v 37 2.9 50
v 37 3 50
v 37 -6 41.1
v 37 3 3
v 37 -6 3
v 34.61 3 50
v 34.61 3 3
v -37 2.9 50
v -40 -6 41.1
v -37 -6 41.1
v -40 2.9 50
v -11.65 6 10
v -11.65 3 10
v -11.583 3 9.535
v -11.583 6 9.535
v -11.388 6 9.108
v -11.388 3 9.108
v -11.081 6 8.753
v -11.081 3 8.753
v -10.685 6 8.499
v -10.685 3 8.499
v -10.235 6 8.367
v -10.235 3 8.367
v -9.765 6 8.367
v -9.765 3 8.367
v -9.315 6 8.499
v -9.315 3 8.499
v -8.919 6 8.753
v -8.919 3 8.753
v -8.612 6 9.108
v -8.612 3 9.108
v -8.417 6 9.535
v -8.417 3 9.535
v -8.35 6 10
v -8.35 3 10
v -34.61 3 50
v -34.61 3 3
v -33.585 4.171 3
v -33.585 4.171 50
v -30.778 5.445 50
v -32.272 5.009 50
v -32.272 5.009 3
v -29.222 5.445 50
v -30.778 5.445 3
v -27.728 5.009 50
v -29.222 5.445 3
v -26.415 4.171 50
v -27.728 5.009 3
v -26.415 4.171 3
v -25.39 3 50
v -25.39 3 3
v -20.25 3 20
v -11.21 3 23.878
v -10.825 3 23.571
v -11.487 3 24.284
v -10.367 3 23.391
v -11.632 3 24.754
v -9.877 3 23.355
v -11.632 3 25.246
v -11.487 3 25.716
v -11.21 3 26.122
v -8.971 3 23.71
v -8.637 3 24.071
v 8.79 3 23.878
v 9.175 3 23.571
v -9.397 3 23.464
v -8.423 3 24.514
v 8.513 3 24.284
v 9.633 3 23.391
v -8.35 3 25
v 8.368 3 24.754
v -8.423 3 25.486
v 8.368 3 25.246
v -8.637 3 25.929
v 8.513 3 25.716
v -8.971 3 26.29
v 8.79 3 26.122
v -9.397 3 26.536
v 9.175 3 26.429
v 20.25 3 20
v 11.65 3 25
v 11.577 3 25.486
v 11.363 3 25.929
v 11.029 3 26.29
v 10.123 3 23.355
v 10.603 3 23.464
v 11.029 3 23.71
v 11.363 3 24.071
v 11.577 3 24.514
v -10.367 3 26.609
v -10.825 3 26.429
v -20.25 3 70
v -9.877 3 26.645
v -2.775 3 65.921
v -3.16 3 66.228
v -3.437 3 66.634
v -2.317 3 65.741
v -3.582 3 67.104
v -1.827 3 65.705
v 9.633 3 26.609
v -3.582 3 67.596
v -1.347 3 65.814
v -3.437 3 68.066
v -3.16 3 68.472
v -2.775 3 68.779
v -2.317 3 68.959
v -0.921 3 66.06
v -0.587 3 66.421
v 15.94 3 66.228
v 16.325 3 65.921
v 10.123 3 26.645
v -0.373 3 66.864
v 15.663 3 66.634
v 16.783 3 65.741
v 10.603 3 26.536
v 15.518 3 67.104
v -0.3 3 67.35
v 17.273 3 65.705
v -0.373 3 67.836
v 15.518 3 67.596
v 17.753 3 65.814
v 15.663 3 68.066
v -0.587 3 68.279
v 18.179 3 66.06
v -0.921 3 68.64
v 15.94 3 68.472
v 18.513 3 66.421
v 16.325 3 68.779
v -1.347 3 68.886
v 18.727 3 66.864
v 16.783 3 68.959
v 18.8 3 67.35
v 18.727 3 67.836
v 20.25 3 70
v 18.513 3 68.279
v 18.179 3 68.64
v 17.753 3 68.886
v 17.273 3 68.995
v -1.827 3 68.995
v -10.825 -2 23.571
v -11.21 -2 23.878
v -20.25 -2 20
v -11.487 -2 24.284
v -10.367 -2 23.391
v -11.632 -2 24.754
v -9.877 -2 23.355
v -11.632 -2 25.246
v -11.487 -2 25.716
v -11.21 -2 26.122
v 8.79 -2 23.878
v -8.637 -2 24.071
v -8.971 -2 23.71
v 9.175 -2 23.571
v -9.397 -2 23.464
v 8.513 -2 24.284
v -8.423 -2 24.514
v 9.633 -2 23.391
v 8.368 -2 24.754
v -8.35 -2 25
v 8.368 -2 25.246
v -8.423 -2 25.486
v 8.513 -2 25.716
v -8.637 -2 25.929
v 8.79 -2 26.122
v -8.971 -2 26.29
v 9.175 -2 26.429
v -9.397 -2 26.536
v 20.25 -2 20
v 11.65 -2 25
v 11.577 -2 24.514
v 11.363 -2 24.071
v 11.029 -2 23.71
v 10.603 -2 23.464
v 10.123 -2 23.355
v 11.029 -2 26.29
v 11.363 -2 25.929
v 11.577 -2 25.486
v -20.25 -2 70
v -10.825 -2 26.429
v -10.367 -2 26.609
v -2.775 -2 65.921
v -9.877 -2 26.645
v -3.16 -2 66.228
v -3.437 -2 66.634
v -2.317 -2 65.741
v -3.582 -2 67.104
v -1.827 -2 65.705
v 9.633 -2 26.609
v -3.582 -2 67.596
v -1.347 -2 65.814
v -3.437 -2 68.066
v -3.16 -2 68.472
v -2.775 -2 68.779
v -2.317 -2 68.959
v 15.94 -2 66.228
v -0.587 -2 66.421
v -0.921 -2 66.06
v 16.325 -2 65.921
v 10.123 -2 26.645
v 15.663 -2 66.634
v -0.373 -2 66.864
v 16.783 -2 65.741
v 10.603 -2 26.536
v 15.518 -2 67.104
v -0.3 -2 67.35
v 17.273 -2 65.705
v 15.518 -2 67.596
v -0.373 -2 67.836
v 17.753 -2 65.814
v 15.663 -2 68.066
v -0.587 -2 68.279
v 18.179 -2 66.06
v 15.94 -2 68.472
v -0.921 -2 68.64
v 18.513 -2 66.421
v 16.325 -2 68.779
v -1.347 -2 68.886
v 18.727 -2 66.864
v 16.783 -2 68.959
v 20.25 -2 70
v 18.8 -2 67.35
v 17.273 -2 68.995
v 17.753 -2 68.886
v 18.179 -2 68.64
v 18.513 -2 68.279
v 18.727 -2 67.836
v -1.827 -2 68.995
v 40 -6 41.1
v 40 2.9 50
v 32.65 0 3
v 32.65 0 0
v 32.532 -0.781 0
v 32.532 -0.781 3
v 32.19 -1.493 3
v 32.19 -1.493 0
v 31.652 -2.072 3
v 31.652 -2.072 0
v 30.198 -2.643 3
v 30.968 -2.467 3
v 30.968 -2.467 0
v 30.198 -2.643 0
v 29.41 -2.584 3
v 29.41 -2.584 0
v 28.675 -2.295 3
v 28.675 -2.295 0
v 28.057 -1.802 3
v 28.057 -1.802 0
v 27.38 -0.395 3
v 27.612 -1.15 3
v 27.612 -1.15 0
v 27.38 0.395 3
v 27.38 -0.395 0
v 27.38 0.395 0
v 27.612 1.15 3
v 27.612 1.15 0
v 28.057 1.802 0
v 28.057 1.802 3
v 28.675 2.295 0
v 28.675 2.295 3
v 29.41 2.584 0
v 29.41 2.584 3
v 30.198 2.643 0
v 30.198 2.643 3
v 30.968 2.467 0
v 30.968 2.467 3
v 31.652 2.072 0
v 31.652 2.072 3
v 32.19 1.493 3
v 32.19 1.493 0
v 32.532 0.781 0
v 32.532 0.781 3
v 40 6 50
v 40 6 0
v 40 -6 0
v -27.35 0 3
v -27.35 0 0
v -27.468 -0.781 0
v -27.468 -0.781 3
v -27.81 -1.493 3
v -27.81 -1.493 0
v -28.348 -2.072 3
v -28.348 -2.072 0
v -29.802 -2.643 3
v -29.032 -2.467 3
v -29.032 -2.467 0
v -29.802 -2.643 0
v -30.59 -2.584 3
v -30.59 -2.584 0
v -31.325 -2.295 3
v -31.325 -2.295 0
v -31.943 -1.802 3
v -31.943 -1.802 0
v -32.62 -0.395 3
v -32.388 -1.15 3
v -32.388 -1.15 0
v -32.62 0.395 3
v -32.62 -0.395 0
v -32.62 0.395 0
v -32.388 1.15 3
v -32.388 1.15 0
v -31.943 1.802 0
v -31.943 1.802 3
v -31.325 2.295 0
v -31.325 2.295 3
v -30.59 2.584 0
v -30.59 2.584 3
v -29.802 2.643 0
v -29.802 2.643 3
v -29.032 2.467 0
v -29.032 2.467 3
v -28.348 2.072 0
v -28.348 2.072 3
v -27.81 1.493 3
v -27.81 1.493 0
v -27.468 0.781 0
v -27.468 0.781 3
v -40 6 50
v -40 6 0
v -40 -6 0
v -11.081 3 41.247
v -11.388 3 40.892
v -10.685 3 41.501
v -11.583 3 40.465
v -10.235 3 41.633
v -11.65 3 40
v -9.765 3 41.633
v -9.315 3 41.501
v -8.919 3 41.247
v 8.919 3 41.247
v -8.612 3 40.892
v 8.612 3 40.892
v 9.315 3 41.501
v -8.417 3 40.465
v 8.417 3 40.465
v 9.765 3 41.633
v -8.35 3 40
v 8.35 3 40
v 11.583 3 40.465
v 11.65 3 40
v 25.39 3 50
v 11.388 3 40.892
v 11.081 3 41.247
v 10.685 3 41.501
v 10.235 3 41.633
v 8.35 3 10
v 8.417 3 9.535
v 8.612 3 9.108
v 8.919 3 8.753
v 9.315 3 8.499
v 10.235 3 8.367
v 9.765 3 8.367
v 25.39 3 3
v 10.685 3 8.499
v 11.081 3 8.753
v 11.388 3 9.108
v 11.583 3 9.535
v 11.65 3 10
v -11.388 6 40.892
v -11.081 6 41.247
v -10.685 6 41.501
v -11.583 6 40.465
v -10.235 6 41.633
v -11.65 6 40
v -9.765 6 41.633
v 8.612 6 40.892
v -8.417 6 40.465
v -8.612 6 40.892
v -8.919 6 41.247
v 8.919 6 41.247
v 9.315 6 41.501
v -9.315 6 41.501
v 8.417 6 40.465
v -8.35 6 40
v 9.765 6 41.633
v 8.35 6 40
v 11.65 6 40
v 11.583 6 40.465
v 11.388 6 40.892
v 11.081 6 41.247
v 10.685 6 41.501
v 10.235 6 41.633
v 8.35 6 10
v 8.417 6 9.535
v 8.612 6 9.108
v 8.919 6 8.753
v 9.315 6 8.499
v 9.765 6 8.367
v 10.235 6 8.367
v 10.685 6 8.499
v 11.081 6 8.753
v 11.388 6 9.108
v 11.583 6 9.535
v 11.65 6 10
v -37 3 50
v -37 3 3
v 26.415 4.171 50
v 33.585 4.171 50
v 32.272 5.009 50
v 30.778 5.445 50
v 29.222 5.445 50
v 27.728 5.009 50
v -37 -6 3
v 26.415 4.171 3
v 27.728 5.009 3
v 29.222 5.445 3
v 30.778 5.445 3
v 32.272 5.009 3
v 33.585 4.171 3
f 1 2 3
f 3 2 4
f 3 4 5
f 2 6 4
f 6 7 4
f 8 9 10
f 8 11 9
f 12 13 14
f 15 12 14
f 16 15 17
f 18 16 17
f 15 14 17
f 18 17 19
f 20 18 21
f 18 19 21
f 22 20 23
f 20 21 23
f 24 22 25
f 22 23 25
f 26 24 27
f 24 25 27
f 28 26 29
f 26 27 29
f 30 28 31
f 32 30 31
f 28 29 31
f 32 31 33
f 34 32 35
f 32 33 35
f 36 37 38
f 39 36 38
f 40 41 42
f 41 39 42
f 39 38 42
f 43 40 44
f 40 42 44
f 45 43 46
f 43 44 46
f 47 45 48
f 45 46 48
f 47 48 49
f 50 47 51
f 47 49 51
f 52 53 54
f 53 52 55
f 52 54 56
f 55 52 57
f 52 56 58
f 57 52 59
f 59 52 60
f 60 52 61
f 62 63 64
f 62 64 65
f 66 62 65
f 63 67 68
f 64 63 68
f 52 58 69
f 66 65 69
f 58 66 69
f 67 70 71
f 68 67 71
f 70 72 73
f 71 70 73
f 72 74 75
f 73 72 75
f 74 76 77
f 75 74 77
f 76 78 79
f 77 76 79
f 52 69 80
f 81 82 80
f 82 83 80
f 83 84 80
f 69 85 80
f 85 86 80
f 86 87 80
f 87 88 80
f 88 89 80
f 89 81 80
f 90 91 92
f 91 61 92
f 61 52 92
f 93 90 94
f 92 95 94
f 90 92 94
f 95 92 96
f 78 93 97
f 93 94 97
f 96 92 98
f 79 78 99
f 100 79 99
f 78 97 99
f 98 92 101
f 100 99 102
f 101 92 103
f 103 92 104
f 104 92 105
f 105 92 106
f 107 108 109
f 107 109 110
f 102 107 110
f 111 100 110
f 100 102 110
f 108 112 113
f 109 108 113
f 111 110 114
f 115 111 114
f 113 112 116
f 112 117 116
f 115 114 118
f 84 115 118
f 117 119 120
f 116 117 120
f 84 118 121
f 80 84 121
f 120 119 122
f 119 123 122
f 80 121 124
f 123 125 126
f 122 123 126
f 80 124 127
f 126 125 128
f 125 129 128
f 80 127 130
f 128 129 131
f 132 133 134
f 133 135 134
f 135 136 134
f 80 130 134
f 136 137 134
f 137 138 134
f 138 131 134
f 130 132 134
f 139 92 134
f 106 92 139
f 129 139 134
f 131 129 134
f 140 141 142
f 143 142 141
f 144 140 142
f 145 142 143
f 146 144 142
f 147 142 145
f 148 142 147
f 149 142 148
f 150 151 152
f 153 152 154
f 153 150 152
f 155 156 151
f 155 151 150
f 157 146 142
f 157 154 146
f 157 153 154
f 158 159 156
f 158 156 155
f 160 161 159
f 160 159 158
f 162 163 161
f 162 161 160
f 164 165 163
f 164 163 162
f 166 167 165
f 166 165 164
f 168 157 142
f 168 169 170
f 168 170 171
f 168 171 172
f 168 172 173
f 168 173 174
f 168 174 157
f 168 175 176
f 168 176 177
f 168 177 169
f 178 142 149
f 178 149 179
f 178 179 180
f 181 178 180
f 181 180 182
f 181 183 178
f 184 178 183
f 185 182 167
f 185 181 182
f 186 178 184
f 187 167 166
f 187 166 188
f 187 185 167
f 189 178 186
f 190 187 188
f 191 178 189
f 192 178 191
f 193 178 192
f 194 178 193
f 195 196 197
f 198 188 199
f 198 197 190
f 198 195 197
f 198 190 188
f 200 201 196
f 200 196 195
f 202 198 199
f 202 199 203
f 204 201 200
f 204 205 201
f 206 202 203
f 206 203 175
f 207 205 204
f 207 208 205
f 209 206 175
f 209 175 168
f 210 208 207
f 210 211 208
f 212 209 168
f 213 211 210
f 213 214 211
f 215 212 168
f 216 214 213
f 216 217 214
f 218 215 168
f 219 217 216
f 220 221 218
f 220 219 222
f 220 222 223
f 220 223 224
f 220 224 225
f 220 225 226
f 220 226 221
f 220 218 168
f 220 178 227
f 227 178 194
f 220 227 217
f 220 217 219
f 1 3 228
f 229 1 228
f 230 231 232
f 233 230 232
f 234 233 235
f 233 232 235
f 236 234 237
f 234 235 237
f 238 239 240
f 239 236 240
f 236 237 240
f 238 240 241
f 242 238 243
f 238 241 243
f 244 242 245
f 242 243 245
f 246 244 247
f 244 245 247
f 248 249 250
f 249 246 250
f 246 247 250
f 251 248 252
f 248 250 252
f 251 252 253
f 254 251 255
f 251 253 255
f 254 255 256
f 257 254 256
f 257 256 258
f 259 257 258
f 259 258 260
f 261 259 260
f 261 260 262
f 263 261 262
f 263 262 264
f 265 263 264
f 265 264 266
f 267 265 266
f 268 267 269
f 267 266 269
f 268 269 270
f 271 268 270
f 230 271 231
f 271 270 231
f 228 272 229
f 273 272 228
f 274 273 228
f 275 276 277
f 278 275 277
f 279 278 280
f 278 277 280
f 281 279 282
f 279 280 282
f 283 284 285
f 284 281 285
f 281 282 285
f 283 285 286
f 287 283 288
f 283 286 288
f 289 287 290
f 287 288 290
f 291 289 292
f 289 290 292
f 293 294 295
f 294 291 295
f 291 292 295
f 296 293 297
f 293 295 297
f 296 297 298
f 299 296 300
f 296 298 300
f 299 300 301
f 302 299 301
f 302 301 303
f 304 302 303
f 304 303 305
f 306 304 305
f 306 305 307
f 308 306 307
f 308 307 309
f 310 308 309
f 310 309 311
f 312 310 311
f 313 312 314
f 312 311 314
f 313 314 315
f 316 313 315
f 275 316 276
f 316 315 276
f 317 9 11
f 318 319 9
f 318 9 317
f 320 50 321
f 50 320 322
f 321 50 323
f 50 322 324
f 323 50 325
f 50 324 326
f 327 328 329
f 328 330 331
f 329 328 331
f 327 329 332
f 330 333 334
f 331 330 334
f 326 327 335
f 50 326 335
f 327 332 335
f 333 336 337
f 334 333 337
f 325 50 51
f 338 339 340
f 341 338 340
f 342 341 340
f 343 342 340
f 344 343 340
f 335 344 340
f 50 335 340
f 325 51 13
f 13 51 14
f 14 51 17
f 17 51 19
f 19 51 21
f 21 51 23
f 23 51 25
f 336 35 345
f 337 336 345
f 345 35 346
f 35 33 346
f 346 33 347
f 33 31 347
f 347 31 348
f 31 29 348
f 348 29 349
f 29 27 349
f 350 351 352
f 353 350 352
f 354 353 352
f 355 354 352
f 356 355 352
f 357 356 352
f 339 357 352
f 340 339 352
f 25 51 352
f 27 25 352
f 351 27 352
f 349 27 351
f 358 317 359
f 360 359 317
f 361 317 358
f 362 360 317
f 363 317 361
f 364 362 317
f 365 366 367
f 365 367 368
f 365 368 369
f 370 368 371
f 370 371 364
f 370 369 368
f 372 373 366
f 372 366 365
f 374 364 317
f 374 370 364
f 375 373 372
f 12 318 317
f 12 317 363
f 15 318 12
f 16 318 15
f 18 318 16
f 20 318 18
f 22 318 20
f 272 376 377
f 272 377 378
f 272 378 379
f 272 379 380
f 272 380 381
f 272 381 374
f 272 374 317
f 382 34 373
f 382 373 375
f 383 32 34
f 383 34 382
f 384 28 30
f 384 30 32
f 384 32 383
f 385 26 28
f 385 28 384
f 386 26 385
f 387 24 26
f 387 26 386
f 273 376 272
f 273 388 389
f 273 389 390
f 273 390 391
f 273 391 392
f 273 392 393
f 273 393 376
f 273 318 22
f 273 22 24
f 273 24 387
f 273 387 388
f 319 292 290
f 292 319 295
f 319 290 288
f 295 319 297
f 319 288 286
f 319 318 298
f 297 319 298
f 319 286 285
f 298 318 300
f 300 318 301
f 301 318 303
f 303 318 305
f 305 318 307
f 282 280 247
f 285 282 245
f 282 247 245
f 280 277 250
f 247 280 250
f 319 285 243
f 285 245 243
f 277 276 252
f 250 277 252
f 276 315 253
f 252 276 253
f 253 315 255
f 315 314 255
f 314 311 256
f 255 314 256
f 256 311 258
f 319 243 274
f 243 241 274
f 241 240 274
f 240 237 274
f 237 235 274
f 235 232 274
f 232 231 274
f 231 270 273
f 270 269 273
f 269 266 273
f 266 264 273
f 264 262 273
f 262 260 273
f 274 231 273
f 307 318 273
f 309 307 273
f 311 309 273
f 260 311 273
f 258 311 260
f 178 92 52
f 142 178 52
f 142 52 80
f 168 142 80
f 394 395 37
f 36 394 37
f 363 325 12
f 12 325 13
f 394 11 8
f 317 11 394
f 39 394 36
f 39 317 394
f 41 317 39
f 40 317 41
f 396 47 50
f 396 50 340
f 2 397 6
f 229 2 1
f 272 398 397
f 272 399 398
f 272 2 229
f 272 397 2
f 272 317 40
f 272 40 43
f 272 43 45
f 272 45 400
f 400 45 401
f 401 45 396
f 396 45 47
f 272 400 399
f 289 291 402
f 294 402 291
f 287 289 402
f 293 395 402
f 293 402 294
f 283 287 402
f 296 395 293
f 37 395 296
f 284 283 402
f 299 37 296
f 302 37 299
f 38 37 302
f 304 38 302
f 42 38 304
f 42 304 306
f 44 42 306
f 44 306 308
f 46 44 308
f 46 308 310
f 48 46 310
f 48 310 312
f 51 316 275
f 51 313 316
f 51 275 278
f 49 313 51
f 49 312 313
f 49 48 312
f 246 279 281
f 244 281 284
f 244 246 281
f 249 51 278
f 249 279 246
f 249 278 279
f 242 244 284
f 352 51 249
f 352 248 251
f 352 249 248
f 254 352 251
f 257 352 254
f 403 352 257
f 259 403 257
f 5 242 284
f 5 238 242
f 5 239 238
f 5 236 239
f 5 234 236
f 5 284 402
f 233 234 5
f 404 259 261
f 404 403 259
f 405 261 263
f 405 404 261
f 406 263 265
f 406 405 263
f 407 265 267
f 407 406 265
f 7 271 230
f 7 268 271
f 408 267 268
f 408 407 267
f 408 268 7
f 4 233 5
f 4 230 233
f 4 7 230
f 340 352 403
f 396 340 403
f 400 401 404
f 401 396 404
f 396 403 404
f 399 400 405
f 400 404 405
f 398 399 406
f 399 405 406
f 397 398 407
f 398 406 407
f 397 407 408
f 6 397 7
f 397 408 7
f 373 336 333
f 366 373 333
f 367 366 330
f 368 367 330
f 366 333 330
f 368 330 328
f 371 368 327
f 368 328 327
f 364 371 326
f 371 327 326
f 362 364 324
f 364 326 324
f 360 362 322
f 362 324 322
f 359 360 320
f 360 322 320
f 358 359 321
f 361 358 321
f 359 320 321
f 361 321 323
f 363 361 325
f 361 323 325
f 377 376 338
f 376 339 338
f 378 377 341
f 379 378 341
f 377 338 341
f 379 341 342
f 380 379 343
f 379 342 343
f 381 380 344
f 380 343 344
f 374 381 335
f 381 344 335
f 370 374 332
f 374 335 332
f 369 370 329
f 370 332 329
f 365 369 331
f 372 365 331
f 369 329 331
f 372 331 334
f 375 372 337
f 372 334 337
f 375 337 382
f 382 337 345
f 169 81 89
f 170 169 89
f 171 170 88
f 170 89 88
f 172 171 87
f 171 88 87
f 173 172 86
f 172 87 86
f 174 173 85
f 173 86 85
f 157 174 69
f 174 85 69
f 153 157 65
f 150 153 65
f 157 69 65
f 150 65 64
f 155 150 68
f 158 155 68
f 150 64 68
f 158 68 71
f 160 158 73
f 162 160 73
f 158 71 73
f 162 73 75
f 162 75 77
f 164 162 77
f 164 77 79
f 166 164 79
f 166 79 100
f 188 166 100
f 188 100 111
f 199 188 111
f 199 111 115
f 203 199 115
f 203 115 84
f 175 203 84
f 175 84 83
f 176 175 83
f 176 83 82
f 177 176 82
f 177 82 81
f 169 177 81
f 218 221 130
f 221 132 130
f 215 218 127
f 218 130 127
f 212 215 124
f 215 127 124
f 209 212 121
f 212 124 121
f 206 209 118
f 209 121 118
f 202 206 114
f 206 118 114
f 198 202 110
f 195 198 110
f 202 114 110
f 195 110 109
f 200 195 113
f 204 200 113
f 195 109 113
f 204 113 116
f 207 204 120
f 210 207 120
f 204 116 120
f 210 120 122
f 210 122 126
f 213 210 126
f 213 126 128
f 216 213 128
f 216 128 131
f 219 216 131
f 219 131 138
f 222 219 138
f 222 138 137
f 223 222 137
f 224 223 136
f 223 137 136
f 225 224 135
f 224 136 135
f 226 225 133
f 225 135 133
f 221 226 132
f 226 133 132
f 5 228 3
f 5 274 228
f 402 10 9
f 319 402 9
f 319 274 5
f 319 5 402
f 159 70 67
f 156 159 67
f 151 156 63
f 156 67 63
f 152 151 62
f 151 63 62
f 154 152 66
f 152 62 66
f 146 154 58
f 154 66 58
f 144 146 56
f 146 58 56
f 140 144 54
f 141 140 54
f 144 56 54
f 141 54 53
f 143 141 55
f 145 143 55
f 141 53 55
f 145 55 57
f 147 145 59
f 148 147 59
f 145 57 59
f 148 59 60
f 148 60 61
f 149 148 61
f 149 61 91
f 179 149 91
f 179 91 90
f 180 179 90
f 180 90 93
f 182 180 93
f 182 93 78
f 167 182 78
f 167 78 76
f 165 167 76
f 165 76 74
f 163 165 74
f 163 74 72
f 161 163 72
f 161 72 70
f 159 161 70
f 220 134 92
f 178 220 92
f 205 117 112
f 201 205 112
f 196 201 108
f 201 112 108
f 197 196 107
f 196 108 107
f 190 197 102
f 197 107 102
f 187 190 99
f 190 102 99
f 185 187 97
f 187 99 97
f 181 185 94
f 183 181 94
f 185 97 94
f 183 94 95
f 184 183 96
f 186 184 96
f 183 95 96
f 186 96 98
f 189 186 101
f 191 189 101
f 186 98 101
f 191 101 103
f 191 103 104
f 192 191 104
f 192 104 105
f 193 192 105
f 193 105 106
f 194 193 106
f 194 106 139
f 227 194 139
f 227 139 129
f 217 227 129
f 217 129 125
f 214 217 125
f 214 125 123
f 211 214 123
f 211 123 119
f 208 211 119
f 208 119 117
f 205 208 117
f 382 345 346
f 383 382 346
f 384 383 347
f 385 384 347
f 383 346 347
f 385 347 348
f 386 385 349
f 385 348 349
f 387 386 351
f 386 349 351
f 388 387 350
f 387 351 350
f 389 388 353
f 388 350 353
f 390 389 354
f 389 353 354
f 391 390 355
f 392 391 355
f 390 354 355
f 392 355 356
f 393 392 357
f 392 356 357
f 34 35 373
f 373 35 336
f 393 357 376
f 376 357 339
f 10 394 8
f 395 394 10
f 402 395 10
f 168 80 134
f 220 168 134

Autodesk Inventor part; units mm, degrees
ref_plane "YZ Plane" through (0, 0, 0) normal (1, 0, 0) x (0, 1, 0)
ref_plane "XZ Plane" through (0, 0, 0) normal (0, 1, 0) x (-1, 0, 0)
ref_plane "XY Plane" through (0, 0, 0) normal (0, 0, 1) x (1, 0, 0)
sketch "Sketch1" plane through (0, 0, 0) normal (0, 0, 1) x (1, 0, 0)
  line L0 (40, -6) -> (-40, -6)
  line L1 (-40, -6) -> (-40, 6)
  line L2 (-40, 6) -> (40, 6)
  line L3 (40, 6) -> (40, -6)
  line L4 (40, -6) -> (-40, 6) construction
  line L5 (-40, -6) -> (40, 6) construction
  line L6 (-30, 0) -> (30, 0) construction
  circle A0 centre (-30, 0) radius 2.65
  circle A1 centre (30, 0) radius 2.65
  circle A2 centre (-30, 0) radius 5.5
  circle A3 centre (30, 0) radius 5.5
  line L7 (-40, 3) -> (40, 3)
  line L8 (-37, 6) -> (-37, -6)
  line L9 (37, 6) -> (37, -6)
  point P0 (0, 0)
  point P1 (-37, 3)
  point P2 (-34.6098, 3)
  point P3 (-25.3902, 3)
  point P4 (25.3902, 3)
  point P5 (34.6098, 3)
  point P6 (37, 3)
  dimension "d0" = 80
  dimension "d1" = 12
  dimension "d2" = 60
  dimension "d3" = 5.3
  dimension "d4" = 5.3
  dimension "d5" = 11
  dimension "d6" = 11
  dimension "d7" = 3
  dimension "d8" = 3
  dimension "d9" = 3
extrude "Extrusion1" add sketch "Sketch1" along normal blind 3
extrude "Extrusion2" add sketch "Sketch1" along normal blind 50 contours L0 L9 L7 L3 | L7 L9 L2 L3 | L0 L1 L7 L8 | L7 A3 A2 L8 L2 L9 | L7 L1 L2 L8
chamfer "Chamfer1" distance 8.9 angle 45 2 edges at (-38.5, -6, 50) (38.5, -6, 50)
sketch "Sketch2" plane through (-25.3902, 3, 3) normal (0, -1, 0) x (1, 0, 0)
  line L0 (0, 47) -> (50.7805, 47) projected
  line L1 (25.3902, 47) -> (25.3902, 22) construction
  line L2 (35.3902, 22) -> (15.3902, 22) construction
  line L3 (35.3902, 7) -> (35.3902, 37) construction
  line L4 (37.0402, 7) -> (37.0402, 37)
  line L5 (33.7402, 37) -> (33.7402, 7)
  arc A0 (33.7402, 7) -> (37.0402, 7) centre (35.3902, 7) ccw
  arc A1 (37.0402, 37) -> (33.7402, 37) centre (35.3902, 37) ccw
  line L6 (15.3902, 7) -> (15.3902, 37) construction
  line L7 (17.0402, 7) -> (17.0402, 37)
  line L8 (13.7402, 37) -> (13.7402, 7)
  arc A2 (13.7402, 7) -> (17.0402, 7) centre (15.3902, 7) ccw
  arc A3 (17.0402, 37) -> (13.7402, 37) centre (15.3902, 37) ccw
  circle A4 centre (35.3902, 22) radius 1.65
  circle A5 centre (15.3902, 22) radius 1.65
  line L9 (45.6402, 67) -> (5.1402, 67)
  line L10 (5.1402, 67) -> (5.1402, 17)
  line L11 (5.1402, 17) -> (45.6402, 17)
  line L12 (45.6402, 17) -> (45.6402, 67)
  circle A6 centre (23.4402, 64.35) radius 1.65
  line L13 (42.5402, 64.35) -> (23.4402, 64.35) construction
  line L14 (45.6402, 50.9) -> (45.6402, 67)
  line L15 (5.1402, 50.9) -> (45.6402, 50.9)
  line L16 (5.1402, 67) -> (5.1402, 50.9)
  line L17 (45.6402, 67) -> (5.1402, 67)
  circle A7 centre (42.5402, 64.35) radius 1.65
  line L18 (25.3902, 22) -> (25.3902, 17)
  point P0 (25.3902, -3)
  dimension "d17" = 20
  dimension "d18" = 1.65
  dimension "d19" = 30
  dimension "d20" = 25
  dimension "d23" = 5
  dimension "d24" = 20
  dimension "d36" = 40.5
  dimension "d37" = 16.1
  dimension "d38" = 19.1
  dimension "d39" = 3.3
  dimension "d40" = 3.3
  dimension "d41" = 2.65
  dimension "d42" = 3.1
extrude "Extrusion3" cut sketch "Sketch2" against normal through all contours L11 L7 A2 L8 | L8 A5 L7 L11 | L11 L5 A4 L4 | L4 A0 L5 L11 | L8 A3 L7 A5 | A5 | A4 L5 A1 L4 | A4
extrude "Extrusion4" add sketch "Sketch2" along normal blind 5 separate body contours L10 L15 L12 L0 | L0 L12 L11 L4 A1 L5 L7 A3 L8 L10 | L10 L9 L12 L15 | L8 A5 L7 L11 | L11 L5 A4 L4 | L8 A3 L7 A5 | A4 L5 A1 L4 | A6 | A7
extrude "Extrusion5" cut sketch "Sketch2" along normal through all contours A6 | A7 bodies 1 2
properties part number "Soporte Y"
